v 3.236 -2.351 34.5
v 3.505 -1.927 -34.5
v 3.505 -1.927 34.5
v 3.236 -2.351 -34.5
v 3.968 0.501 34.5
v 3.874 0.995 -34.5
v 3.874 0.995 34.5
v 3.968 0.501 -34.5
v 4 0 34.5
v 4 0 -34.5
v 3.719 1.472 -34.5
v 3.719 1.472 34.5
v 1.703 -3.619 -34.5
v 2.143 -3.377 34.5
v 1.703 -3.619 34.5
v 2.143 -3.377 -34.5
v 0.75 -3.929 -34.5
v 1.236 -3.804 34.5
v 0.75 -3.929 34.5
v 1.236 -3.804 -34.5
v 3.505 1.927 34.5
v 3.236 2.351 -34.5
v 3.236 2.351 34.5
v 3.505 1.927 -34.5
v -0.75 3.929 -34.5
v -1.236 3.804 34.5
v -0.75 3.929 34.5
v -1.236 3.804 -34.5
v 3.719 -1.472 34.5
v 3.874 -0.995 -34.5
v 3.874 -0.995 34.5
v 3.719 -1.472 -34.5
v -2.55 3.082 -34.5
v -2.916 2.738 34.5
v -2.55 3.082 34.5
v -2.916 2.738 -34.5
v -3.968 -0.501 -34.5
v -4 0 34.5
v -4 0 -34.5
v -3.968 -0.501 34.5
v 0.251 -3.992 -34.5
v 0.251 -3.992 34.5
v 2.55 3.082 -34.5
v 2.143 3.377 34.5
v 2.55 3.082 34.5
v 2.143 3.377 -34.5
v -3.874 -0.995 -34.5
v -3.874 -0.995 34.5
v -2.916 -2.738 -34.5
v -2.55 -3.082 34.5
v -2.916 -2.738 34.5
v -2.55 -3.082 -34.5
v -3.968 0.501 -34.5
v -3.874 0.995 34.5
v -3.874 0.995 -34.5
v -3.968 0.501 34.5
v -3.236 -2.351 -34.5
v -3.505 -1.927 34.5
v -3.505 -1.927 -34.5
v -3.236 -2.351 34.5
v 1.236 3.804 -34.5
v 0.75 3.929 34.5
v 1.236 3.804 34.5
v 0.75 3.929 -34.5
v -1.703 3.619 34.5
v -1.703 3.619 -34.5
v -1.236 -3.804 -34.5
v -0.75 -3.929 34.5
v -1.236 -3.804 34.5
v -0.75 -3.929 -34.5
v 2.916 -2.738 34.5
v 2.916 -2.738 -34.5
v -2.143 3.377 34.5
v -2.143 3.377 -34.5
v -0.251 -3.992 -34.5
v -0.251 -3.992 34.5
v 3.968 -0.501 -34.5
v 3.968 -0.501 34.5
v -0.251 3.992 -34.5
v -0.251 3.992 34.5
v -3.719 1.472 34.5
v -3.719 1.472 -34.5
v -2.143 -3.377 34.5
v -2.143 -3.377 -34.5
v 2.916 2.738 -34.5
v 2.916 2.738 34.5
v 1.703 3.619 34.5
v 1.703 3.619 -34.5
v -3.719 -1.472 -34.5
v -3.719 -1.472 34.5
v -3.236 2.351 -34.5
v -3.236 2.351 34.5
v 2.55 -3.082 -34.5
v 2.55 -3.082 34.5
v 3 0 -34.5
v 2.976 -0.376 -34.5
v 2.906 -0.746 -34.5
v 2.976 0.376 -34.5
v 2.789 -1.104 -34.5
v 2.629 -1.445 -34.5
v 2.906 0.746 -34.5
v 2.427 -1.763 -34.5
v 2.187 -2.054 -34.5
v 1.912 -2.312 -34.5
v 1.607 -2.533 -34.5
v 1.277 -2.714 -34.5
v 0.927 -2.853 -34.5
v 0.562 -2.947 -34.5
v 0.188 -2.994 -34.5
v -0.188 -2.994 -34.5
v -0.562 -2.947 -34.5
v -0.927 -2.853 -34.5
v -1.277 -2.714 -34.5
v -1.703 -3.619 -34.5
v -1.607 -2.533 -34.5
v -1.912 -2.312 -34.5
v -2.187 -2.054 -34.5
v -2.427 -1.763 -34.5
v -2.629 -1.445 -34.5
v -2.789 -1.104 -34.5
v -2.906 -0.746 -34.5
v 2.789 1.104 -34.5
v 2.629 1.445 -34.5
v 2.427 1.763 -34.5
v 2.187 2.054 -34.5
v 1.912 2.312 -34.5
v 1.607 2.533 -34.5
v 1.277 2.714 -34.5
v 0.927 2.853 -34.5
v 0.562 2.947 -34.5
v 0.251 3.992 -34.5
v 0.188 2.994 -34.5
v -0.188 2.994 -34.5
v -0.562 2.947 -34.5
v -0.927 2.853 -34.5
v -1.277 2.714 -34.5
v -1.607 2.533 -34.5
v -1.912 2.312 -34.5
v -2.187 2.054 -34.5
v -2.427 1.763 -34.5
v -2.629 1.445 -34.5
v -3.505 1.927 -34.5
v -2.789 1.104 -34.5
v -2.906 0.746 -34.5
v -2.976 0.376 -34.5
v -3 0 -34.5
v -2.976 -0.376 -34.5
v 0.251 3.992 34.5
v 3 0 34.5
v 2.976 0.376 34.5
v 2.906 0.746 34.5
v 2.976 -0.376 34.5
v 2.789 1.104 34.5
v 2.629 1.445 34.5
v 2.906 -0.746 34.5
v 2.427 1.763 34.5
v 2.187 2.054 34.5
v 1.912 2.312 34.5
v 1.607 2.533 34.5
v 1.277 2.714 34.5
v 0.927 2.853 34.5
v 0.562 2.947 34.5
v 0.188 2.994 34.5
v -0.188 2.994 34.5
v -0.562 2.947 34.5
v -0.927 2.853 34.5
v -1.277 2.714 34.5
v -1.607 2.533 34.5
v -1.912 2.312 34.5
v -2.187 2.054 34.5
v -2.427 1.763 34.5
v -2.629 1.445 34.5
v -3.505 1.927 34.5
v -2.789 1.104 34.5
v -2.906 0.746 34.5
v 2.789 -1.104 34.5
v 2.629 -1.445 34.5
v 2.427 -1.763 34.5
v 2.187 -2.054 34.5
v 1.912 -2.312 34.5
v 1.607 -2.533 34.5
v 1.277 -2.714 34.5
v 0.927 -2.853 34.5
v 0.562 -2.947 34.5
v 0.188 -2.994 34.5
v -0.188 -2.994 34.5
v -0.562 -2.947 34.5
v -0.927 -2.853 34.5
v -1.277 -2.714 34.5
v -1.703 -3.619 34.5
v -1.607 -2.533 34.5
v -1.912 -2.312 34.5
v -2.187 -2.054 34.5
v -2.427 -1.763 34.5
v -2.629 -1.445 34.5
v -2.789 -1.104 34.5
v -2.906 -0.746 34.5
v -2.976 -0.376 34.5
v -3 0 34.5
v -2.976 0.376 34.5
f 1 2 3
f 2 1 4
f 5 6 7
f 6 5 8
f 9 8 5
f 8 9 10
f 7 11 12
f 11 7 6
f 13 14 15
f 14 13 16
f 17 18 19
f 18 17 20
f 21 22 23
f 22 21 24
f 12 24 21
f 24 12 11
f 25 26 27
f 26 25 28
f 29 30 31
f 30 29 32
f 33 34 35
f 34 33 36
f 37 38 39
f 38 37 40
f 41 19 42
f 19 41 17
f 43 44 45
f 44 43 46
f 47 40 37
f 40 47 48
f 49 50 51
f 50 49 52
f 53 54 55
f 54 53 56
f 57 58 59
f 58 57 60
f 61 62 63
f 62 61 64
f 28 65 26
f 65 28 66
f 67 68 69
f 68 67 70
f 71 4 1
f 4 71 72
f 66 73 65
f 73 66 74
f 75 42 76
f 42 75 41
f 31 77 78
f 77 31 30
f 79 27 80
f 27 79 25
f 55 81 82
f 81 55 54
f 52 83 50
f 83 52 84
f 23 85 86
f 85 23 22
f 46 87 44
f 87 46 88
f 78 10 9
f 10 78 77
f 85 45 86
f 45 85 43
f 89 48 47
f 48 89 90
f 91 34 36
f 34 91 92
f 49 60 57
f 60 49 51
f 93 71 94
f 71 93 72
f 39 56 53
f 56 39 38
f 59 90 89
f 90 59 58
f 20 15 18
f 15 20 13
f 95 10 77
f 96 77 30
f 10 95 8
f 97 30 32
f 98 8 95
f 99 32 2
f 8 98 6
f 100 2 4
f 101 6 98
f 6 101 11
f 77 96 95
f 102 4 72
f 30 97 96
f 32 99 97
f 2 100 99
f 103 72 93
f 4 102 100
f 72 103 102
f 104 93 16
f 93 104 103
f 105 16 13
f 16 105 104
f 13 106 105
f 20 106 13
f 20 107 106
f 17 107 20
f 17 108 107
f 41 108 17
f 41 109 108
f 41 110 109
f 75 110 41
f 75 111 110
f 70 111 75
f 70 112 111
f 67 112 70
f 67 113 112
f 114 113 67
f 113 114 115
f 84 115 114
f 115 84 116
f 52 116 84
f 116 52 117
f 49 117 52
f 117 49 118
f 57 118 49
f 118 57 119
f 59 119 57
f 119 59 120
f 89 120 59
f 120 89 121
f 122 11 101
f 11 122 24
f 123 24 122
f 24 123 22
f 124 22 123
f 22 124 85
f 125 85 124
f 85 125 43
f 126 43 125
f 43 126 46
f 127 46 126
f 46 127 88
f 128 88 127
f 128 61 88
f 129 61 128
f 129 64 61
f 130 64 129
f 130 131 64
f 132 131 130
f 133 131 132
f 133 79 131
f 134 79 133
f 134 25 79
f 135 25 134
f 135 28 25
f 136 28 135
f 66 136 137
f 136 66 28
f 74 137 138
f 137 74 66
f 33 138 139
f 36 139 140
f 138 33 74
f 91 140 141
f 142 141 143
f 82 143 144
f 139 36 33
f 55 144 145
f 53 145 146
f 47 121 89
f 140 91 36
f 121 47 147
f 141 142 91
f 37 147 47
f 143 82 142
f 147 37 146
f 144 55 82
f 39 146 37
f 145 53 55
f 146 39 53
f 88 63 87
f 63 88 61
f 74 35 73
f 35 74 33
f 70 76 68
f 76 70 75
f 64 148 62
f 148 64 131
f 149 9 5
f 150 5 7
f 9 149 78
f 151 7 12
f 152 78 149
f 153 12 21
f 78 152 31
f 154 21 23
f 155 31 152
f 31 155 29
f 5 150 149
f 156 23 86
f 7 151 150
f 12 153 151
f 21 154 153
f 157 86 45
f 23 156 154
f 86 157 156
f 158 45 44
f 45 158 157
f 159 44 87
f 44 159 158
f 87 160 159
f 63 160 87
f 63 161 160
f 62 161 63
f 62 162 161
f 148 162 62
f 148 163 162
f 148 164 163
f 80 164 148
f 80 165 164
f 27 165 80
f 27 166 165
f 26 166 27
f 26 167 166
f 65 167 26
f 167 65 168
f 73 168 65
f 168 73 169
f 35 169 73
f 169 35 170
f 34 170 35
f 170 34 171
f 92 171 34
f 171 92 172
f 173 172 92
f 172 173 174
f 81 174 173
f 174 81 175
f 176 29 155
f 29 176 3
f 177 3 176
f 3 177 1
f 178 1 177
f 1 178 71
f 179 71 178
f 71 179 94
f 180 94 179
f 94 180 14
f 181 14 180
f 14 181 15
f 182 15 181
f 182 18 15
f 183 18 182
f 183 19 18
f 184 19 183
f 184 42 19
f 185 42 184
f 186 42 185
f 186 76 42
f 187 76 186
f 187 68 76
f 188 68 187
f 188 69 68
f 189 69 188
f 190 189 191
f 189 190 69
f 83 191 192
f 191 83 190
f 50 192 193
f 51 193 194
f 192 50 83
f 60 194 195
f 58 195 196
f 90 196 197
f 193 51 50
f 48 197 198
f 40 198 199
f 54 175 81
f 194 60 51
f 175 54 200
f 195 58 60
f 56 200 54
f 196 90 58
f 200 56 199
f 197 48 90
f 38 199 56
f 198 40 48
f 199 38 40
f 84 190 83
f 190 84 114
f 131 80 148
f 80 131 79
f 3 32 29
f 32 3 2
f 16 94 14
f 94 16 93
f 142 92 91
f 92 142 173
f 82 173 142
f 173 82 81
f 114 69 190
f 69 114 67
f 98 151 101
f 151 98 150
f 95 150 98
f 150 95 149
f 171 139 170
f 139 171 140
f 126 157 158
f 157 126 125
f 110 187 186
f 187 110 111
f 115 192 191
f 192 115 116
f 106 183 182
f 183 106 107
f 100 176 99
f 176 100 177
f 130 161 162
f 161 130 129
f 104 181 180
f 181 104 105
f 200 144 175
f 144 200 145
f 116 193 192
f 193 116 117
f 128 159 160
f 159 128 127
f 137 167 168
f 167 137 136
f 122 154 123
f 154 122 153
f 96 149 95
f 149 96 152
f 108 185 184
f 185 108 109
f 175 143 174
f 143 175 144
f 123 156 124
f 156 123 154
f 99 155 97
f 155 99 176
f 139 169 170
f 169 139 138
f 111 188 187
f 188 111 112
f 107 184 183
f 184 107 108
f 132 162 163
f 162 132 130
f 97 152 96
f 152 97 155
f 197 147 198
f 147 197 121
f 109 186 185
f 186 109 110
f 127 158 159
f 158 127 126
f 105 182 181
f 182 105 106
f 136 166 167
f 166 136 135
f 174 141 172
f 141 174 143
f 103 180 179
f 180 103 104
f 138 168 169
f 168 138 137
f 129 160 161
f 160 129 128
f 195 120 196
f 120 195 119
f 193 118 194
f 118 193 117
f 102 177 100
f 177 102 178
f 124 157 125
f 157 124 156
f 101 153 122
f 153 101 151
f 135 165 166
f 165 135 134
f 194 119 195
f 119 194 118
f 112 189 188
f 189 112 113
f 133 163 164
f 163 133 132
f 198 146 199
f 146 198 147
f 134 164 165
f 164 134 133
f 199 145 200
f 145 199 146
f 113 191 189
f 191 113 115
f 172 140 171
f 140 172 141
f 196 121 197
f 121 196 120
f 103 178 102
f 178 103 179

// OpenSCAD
$fn = 50;


difference() {
	union() {
		translate(v = [0, 0, -34.5000000000]) {
			cylinder(h = 69, r = 4.0000000000);
		}
	}
	union() {
		translate(v = [0, 0, -100.0000000000]) {
			cylinder(h = 200, r = 3.0000000000);
		}
	}
}
